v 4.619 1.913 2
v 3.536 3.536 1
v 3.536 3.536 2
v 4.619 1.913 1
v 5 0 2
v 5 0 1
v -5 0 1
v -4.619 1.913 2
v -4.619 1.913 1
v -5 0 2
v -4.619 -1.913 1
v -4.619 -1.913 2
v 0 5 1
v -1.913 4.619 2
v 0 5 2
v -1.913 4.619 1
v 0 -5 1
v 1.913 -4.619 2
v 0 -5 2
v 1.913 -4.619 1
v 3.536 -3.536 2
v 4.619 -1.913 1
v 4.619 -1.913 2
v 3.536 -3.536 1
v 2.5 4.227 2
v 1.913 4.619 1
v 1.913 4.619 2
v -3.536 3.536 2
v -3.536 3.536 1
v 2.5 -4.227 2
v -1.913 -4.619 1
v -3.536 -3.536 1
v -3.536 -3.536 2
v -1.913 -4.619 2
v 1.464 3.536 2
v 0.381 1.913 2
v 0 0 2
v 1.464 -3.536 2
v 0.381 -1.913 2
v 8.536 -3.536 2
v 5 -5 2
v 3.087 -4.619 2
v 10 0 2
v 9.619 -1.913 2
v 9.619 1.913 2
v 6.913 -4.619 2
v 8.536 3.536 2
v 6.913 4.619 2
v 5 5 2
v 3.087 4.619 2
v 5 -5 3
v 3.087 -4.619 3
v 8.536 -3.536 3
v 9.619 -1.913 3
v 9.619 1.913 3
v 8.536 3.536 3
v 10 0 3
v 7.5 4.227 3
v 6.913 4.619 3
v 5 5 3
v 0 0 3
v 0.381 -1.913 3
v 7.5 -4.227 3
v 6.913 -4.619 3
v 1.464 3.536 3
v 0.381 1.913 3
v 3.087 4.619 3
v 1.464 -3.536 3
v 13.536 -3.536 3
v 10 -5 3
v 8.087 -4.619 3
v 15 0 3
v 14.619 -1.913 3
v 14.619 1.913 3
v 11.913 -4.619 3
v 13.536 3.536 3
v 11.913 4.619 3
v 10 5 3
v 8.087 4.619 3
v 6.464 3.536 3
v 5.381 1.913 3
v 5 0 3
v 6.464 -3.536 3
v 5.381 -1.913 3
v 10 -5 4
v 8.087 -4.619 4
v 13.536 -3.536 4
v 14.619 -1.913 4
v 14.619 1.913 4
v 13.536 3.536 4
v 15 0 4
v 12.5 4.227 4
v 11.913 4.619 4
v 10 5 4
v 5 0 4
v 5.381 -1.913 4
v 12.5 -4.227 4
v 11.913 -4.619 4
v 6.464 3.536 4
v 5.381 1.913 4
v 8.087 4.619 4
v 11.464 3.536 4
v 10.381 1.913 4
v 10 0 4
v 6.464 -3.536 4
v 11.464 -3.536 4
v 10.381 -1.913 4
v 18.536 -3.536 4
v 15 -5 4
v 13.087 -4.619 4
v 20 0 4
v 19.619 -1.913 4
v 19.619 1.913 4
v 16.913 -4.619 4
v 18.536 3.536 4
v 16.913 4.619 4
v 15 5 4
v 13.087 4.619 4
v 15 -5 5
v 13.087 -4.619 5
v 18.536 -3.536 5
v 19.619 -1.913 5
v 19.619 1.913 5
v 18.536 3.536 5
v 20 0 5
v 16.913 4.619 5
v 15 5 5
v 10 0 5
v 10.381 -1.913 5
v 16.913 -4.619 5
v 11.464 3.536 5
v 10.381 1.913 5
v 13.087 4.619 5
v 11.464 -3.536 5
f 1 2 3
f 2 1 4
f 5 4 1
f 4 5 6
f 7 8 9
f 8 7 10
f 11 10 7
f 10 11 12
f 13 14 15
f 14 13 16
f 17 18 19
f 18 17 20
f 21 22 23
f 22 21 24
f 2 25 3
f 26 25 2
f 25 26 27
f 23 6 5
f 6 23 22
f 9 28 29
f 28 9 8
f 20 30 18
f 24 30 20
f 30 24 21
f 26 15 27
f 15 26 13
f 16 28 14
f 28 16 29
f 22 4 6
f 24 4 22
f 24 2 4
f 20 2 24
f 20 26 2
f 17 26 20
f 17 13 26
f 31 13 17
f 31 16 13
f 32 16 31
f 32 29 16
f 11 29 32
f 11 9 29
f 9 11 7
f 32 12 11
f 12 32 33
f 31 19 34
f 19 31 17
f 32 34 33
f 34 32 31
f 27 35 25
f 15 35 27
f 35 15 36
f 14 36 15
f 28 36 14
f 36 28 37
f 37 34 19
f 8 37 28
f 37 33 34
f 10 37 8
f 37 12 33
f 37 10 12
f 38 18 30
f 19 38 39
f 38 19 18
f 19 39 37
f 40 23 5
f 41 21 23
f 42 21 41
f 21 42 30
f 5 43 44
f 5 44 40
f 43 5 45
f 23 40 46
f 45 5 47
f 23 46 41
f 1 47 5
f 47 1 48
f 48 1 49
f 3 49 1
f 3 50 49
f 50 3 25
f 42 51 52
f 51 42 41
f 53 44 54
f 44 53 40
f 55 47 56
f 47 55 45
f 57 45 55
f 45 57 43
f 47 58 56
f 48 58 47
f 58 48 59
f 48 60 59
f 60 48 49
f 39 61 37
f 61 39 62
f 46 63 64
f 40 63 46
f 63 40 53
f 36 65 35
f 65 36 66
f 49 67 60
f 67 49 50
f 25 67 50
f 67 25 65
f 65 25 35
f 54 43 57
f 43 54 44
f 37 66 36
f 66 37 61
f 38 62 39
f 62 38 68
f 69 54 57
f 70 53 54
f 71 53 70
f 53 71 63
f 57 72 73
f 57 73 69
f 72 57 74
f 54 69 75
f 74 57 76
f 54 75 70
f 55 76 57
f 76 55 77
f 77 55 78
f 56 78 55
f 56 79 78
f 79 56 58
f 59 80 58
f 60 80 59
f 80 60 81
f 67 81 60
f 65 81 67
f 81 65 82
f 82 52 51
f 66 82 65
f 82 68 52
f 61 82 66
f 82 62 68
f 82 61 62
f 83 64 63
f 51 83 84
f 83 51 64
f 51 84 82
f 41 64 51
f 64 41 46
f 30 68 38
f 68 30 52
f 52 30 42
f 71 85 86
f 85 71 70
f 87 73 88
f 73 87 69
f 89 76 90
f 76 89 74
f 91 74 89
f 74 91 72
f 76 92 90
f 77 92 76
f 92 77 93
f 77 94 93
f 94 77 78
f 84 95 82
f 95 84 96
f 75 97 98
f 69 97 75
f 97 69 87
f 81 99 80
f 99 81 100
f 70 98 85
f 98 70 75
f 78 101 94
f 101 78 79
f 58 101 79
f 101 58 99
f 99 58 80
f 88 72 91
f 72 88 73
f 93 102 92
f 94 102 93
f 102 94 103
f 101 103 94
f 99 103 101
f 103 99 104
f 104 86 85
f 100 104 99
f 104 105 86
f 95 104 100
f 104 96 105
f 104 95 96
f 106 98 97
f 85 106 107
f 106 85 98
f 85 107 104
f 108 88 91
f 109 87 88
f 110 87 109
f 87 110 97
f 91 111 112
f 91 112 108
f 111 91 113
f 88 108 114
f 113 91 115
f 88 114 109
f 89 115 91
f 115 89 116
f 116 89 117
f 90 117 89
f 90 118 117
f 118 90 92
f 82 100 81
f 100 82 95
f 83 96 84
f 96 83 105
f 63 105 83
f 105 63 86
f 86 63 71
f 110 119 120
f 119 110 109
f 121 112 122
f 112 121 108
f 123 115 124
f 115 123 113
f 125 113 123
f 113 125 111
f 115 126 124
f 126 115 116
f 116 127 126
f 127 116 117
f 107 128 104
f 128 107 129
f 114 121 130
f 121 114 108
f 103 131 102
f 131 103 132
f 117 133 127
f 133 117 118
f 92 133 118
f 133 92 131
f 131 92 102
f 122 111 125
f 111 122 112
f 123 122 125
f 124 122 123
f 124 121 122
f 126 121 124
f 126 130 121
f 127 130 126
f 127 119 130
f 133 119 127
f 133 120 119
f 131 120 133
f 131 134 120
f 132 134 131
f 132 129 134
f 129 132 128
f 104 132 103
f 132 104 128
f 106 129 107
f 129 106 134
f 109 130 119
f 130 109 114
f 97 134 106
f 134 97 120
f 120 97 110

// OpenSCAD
// Volume: 306.14673427414436, SurfaceArea: 561.0751434436334
module up() {
  translate([0,0,1]) children(0);
}

module red() {
  color("Red") children(0);
}

up() cylinder(r=5);
translate([5,0,0]) up() up() cylinder(r=5);
translate([10,0,0]) up() up() up() red() cylinder(r=5);
translate([15,0,0]) red() up() up() up() up() cylinder(r=5);
